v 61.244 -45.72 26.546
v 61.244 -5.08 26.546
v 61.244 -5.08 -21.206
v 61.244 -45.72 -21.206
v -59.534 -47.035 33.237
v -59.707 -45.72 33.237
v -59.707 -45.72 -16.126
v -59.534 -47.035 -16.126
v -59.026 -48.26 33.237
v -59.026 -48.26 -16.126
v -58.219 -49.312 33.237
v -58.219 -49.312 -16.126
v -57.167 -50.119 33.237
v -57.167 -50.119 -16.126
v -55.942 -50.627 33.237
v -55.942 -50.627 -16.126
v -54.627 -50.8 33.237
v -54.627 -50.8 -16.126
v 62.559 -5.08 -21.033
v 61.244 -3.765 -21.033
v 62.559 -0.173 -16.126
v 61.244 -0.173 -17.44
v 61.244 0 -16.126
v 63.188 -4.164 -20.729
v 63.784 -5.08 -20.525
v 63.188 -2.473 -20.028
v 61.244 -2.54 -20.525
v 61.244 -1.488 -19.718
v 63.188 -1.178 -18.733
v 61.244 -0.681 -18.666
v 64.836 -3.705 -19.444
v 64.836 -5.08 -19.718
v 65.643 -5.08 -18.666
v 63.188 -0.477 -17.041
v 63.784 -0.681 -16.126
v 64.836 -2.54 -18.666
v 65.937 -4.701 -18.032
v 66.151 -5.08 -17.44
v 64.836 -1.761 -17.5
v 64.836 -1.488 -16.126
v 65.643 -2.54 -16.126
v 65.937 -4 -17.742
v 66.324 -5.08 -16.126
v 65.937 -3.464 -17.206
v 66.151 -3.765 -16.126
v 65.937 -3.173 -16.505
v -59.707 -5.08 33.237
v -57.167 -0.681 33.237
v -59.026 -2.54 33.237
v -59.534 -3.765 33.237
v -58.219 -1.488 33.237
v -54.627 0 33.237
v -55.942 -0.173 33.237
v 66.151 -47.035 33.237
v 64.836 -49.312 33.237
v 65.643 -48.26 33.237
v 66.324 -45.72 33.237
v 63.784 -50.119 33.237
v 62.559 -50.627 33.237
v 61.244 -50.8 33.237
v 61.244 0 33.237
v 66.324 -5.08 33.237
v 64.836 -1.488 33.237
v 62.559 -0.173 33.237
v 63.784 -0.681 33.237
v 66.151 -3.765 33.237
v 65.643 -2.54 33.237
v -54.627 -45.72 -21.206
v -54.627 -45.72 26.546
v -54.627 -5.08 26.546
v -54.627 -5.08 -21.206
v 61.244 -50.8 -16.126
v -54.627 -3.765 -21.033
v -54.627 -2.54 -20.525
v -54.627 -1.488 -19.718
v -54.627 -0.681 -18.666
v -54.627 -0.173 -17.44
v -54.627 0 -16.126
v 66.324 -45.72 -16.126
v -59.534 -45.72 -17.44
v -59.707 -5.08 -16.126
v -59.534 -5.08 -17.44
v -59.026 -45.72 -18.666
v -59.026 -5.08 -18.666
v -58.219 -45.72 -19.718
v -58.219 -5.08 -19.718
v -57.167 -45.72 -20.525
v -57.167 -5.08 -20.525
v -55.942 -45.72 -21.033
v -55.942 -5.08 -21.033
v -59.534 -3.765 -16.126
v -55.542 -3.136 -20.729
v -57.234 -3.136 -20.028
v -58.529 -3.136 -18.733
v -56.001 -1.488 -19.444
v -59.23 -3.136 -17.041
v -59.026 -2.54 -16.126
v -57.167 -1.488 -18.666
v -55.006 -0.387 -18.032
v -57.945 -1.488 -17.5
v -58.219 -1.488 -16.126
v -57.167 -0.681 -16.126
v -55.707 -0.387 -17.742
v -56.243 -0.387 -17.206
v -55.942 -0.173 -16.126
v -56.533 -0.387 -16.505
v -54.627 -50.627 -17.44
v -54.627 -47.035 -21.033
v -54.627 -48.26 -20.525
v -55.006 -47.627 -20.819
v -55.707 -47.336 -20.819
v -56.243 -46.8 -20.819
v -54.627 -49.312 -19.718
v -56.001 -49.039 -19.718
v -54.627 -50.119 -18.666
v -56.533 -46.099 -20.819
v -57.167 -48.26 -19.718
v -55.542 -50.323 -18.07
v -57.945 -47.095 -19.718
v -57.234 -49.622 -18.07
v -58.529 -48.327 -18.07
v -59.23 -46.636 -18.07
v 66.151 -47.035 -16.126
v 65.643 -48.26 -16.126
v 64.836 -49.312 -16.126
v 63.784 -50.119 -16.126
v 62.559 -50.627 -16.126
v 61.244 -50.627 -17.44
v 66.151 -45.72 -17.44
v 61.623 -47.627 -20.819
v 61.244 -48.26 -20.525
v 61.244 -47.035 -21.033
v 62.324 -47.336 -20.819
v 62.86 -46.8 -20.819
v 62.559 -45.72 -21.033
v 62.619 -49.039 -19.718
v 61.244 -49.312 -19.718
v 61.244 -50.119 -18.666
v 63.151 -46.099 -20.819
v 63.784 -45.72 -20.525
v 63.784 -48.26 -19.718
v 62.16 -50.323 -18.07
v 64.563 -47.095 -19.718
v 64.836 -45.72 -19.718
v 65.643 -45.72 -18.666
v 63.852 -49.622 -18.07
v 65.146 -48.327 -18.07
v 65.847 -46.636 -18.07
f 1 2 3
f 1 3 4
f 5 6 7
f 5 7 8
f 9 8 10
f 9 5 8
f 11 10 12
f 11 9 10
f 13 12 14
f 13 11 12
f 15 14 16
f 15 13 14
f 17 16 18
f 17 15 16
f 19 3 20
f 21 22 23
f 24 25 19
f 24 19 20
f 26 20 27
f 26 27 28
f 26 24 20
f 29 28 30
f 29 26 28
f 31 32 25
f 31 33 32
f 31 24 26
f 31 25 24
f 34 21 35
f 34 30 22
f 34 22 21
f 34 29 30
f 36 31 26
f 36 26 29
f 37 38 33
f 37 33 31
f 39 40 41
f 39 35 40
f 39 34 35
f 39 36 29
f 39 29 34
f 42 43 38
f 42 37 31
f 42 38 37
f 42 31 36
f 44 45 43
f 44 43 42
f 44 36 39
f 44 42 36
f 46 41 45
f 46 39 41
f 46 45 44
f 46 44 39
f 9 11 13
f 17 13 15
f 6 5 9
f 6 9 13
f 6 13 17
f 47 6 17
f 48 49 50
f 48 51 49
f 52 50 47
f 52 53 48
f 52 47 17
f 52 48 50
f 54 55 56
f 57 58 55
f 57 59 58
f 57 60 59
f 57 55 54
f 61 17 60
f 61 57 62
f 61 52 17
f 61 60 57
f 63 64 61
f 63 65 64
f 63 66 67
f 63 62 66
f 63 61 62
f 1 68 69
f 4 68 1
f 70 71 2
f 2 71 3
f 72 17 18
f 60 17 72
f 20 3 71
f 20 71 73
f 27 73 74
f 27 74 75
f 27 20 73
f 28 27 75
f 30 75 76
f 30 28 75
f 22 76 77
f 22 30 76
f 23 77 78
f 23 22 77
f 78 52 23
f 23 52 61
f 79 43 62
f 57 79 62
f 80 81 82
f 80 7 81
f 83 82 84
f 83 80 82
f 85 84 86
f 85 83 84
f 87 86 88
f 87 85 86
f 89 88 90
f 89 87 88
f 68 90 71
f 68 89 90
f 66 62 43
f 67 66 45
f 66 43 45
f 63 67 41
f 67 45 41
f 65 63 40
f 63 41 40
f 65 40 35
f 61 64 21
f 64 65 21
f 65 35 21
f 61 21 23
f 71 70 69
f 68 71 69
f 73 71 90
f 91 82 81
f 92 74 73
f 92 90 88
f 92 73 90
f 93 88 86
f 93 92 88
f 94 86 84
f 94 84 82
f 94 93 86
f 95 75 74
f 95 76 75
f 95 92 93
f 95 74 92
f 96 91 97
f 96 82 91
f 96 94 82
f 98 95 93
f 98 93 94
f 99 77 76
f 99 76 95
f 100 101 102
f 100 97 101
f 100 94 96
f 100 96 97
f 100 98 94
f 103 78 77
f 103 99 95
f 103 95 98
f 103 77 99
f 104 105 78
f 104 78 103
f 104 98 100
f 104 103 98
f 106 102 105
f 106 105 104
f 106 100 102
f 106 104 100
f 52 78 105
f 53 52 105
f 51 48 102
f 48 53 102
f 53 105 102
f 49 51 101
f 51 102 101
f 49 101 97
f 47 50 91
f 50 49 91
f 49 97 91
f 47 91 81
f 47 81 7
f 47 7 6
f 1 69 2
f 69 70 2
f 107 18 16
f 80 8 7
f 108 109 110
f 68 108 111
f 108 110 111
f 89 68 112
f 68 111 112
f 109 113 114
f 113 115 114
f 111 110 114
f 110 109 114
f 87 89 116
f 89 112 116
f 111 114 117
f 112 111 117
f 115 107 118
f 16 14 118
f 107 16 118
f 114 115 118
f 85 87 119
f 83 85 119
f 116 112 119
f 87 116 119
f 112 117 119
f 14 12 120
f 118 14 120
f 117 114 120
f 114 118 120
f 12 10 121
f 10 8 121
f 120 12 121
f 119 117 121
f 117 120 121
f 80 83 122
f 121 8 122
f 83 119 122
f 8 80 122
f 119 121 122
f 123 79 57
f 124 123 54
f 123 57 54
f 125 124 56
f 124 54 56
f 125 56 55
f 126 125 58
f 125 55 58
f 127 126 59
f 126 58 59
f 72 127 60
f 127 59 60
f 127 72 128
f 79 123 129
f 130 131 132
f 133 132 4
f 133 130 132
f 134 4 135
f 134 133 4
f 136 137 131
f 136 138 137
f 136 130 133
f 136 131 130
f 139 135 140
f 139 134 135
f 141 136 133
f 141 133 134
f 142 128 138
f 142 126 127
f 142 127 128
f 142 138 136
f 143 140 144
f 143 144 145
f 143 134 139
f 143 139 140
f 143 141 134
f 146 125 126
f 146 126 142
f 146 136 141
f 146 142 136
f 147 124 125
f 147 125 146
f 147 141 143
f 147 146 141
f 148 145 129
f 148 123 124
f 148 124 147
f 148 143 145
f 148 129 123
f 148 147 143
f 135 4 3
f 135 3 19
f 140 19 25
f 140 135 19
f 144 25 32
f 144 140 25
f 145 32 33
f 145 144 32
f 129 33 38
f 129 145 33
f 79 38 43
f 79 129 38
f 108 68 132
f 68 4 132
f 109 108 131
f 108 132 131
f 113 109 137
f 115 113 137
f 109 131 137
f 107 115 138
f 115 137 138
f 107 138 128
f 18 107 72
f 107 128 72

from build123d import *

# Parameters (mm, degrees)
F0_W         = 126.0307952762
F0_H         = 54.4428955764
F1_DEPTH     = 50.8
F2_R         = 5.08
F3_T1_DEPTH  = 62.0628955764
F3_S5_W      = 5.08
F3_S5_H      = 5.08
F3_T6_DEPTH  = 5.08
F3_S11_W     = 5.08
F3_S11_H     = 5.08
F3_T12_DEPTH = 5.08
F4_DEPTH     = 47.752


# Not quite as in the source:
# - a fillet or chamfer that OpenCascade refuses, or shapes differently, is made with other operations: its cross-section is extruded or revolved along the edge and cut away or added


with BuildPart() as f1:
    # F0 (on Front) → F1 (new body)
    with BuildSketch(Plane.XZ):
        with Locations((3.3086873591, 6.0157896951)):
            Rectangle(F0_W, F0_H)
    extrude(amount=F1_DEPTH)

    # F2
    f2_edges = [f1.edges().sort_by_distance(p)[0] for p in [
        (66.324085, -50.8, 6.01579),
        (-59.70671, -50.8, 6.01579),
        (3.308687, -50.8, -21.205658),
        (-59.70671, -25.4, -21.205658),
        (66.324085, -25.4, -21.205658),
        (3.308687, 0, -21.205658),
    ]]
    fillet(f2_edges, radius=F2_R)

    # F3: fillet of radius 5.08 on 2 edges, made by hand

    # F3_s2 → F3_t1 (cut)
    with BuildSketch(Plane.XY.offset(-16.1256580931)):
        with BuildLine():
            ThreePointArc((66.3240849972, -5.08), (64.8361874456, -1.4878975516), (61.2440849972, 0))
            Line((61.2440849972, 0), (66.3240849972, 0))
            Line((66.3240849972, 0), (66.3240849972, -5.08))
        make_face()
        with BuildLine():
            ThreePointArc((-54.626710279, 0), (-58.2188127274, -1.4878975516), (-59.706710279, -5.08))
            Line((-59.706710279, -5.08), (-59.706710279, 0))
            Line((-59.706710279, 0), (-54.626710279, 0))
        make_face()
    extrude(amount=F3_T1_DEPTH, mode=Mode.SUBTRACT)


with BuildPart() as f3_tool4:
    # F3_s5 → F3_t6 (new body)
    with BuildSketch(Plane.XZ.offset(5.08)):
        with Locations((-57.166710279, -18.6656580931)):
            Rectangle(F3_S5_W, F3_S5_H)
    extrude(amount=-F3_T6_DEPTH)

    # F3_s7 → F3_t8 (revolve, cut)
    with BuildSketch(Plane(origin=(-54.626710279, -5.08, -16.1256580931), x_dir=(0.7071067812, 0, 0.7071067812), z_dir=(-0.7071067812, 0, 0.7071067812))):
        with BuildLine():
            ThreePointArc((0, -5.08), (5.08, 0), (0, 5.08))
            Line((0, 5.08), (0, -5.08))
        make_face()
    revolve(axis=Axis((-54.626710279, -5.08, -16.1256580931), (0, 1, 0)), mode=Mode.SUBTRACT)


with BuildPart() as f1_1:
    add(f1.part)

    # F3_t3: cut F3_tool4
    add(f3_tool4.part, mode=Mode.SUBTRACT)


with BuildPart() as f3_tool10:
    # F3_s11 → F3_t12 (new body)
    with BuildSketch(Plane.YZ.offset(61.2440849972)):
        with Locations((-2.54, -18.6656580931)):
            Rectangle(F3_S11_W, F3_S11_H)
    extrude(amount=F3_T12_DEPTH)

    # F3_s13 → F3_t14 (revolve, cut)
    with BuildSketch(Plane(origin=(61.2440849972, -5.08, -16.1256580931), x_dir=(0, -0.7071067812, 0.7071067812), z_dir=(0, 0.7071067812, 0.7071067812))):
        with BuildLine():
            ThreePointArc((0, -5.08), (5.08, 0), (0, 5.08))
            Line((0, 5.08), (0, -5.08))
        make_face()
    revolve(axis=Axis((61.2440849972, -5.08, -16.1256580931), (1, 0, 0)), mode=Mode.SUBTRACT)


with BuildPart() as f1_2:
    add(f1_1.part)

    # F3_t9: cut F3_tool10
    add(f3_tool10.part, mode=Mode.SUBTRACT)

    # F4 (cut): a face of the model
    f4_faces = [f1_2.faces().sort_by_distance(p)[0] for p in [
        (3.3086873591, -25.4, -21.2056580931),
    ]]
    extrude(f4_faces, amount=-F4_DEPTH, mode=Mode.SUBTRACT)


solid = f1_2.part
